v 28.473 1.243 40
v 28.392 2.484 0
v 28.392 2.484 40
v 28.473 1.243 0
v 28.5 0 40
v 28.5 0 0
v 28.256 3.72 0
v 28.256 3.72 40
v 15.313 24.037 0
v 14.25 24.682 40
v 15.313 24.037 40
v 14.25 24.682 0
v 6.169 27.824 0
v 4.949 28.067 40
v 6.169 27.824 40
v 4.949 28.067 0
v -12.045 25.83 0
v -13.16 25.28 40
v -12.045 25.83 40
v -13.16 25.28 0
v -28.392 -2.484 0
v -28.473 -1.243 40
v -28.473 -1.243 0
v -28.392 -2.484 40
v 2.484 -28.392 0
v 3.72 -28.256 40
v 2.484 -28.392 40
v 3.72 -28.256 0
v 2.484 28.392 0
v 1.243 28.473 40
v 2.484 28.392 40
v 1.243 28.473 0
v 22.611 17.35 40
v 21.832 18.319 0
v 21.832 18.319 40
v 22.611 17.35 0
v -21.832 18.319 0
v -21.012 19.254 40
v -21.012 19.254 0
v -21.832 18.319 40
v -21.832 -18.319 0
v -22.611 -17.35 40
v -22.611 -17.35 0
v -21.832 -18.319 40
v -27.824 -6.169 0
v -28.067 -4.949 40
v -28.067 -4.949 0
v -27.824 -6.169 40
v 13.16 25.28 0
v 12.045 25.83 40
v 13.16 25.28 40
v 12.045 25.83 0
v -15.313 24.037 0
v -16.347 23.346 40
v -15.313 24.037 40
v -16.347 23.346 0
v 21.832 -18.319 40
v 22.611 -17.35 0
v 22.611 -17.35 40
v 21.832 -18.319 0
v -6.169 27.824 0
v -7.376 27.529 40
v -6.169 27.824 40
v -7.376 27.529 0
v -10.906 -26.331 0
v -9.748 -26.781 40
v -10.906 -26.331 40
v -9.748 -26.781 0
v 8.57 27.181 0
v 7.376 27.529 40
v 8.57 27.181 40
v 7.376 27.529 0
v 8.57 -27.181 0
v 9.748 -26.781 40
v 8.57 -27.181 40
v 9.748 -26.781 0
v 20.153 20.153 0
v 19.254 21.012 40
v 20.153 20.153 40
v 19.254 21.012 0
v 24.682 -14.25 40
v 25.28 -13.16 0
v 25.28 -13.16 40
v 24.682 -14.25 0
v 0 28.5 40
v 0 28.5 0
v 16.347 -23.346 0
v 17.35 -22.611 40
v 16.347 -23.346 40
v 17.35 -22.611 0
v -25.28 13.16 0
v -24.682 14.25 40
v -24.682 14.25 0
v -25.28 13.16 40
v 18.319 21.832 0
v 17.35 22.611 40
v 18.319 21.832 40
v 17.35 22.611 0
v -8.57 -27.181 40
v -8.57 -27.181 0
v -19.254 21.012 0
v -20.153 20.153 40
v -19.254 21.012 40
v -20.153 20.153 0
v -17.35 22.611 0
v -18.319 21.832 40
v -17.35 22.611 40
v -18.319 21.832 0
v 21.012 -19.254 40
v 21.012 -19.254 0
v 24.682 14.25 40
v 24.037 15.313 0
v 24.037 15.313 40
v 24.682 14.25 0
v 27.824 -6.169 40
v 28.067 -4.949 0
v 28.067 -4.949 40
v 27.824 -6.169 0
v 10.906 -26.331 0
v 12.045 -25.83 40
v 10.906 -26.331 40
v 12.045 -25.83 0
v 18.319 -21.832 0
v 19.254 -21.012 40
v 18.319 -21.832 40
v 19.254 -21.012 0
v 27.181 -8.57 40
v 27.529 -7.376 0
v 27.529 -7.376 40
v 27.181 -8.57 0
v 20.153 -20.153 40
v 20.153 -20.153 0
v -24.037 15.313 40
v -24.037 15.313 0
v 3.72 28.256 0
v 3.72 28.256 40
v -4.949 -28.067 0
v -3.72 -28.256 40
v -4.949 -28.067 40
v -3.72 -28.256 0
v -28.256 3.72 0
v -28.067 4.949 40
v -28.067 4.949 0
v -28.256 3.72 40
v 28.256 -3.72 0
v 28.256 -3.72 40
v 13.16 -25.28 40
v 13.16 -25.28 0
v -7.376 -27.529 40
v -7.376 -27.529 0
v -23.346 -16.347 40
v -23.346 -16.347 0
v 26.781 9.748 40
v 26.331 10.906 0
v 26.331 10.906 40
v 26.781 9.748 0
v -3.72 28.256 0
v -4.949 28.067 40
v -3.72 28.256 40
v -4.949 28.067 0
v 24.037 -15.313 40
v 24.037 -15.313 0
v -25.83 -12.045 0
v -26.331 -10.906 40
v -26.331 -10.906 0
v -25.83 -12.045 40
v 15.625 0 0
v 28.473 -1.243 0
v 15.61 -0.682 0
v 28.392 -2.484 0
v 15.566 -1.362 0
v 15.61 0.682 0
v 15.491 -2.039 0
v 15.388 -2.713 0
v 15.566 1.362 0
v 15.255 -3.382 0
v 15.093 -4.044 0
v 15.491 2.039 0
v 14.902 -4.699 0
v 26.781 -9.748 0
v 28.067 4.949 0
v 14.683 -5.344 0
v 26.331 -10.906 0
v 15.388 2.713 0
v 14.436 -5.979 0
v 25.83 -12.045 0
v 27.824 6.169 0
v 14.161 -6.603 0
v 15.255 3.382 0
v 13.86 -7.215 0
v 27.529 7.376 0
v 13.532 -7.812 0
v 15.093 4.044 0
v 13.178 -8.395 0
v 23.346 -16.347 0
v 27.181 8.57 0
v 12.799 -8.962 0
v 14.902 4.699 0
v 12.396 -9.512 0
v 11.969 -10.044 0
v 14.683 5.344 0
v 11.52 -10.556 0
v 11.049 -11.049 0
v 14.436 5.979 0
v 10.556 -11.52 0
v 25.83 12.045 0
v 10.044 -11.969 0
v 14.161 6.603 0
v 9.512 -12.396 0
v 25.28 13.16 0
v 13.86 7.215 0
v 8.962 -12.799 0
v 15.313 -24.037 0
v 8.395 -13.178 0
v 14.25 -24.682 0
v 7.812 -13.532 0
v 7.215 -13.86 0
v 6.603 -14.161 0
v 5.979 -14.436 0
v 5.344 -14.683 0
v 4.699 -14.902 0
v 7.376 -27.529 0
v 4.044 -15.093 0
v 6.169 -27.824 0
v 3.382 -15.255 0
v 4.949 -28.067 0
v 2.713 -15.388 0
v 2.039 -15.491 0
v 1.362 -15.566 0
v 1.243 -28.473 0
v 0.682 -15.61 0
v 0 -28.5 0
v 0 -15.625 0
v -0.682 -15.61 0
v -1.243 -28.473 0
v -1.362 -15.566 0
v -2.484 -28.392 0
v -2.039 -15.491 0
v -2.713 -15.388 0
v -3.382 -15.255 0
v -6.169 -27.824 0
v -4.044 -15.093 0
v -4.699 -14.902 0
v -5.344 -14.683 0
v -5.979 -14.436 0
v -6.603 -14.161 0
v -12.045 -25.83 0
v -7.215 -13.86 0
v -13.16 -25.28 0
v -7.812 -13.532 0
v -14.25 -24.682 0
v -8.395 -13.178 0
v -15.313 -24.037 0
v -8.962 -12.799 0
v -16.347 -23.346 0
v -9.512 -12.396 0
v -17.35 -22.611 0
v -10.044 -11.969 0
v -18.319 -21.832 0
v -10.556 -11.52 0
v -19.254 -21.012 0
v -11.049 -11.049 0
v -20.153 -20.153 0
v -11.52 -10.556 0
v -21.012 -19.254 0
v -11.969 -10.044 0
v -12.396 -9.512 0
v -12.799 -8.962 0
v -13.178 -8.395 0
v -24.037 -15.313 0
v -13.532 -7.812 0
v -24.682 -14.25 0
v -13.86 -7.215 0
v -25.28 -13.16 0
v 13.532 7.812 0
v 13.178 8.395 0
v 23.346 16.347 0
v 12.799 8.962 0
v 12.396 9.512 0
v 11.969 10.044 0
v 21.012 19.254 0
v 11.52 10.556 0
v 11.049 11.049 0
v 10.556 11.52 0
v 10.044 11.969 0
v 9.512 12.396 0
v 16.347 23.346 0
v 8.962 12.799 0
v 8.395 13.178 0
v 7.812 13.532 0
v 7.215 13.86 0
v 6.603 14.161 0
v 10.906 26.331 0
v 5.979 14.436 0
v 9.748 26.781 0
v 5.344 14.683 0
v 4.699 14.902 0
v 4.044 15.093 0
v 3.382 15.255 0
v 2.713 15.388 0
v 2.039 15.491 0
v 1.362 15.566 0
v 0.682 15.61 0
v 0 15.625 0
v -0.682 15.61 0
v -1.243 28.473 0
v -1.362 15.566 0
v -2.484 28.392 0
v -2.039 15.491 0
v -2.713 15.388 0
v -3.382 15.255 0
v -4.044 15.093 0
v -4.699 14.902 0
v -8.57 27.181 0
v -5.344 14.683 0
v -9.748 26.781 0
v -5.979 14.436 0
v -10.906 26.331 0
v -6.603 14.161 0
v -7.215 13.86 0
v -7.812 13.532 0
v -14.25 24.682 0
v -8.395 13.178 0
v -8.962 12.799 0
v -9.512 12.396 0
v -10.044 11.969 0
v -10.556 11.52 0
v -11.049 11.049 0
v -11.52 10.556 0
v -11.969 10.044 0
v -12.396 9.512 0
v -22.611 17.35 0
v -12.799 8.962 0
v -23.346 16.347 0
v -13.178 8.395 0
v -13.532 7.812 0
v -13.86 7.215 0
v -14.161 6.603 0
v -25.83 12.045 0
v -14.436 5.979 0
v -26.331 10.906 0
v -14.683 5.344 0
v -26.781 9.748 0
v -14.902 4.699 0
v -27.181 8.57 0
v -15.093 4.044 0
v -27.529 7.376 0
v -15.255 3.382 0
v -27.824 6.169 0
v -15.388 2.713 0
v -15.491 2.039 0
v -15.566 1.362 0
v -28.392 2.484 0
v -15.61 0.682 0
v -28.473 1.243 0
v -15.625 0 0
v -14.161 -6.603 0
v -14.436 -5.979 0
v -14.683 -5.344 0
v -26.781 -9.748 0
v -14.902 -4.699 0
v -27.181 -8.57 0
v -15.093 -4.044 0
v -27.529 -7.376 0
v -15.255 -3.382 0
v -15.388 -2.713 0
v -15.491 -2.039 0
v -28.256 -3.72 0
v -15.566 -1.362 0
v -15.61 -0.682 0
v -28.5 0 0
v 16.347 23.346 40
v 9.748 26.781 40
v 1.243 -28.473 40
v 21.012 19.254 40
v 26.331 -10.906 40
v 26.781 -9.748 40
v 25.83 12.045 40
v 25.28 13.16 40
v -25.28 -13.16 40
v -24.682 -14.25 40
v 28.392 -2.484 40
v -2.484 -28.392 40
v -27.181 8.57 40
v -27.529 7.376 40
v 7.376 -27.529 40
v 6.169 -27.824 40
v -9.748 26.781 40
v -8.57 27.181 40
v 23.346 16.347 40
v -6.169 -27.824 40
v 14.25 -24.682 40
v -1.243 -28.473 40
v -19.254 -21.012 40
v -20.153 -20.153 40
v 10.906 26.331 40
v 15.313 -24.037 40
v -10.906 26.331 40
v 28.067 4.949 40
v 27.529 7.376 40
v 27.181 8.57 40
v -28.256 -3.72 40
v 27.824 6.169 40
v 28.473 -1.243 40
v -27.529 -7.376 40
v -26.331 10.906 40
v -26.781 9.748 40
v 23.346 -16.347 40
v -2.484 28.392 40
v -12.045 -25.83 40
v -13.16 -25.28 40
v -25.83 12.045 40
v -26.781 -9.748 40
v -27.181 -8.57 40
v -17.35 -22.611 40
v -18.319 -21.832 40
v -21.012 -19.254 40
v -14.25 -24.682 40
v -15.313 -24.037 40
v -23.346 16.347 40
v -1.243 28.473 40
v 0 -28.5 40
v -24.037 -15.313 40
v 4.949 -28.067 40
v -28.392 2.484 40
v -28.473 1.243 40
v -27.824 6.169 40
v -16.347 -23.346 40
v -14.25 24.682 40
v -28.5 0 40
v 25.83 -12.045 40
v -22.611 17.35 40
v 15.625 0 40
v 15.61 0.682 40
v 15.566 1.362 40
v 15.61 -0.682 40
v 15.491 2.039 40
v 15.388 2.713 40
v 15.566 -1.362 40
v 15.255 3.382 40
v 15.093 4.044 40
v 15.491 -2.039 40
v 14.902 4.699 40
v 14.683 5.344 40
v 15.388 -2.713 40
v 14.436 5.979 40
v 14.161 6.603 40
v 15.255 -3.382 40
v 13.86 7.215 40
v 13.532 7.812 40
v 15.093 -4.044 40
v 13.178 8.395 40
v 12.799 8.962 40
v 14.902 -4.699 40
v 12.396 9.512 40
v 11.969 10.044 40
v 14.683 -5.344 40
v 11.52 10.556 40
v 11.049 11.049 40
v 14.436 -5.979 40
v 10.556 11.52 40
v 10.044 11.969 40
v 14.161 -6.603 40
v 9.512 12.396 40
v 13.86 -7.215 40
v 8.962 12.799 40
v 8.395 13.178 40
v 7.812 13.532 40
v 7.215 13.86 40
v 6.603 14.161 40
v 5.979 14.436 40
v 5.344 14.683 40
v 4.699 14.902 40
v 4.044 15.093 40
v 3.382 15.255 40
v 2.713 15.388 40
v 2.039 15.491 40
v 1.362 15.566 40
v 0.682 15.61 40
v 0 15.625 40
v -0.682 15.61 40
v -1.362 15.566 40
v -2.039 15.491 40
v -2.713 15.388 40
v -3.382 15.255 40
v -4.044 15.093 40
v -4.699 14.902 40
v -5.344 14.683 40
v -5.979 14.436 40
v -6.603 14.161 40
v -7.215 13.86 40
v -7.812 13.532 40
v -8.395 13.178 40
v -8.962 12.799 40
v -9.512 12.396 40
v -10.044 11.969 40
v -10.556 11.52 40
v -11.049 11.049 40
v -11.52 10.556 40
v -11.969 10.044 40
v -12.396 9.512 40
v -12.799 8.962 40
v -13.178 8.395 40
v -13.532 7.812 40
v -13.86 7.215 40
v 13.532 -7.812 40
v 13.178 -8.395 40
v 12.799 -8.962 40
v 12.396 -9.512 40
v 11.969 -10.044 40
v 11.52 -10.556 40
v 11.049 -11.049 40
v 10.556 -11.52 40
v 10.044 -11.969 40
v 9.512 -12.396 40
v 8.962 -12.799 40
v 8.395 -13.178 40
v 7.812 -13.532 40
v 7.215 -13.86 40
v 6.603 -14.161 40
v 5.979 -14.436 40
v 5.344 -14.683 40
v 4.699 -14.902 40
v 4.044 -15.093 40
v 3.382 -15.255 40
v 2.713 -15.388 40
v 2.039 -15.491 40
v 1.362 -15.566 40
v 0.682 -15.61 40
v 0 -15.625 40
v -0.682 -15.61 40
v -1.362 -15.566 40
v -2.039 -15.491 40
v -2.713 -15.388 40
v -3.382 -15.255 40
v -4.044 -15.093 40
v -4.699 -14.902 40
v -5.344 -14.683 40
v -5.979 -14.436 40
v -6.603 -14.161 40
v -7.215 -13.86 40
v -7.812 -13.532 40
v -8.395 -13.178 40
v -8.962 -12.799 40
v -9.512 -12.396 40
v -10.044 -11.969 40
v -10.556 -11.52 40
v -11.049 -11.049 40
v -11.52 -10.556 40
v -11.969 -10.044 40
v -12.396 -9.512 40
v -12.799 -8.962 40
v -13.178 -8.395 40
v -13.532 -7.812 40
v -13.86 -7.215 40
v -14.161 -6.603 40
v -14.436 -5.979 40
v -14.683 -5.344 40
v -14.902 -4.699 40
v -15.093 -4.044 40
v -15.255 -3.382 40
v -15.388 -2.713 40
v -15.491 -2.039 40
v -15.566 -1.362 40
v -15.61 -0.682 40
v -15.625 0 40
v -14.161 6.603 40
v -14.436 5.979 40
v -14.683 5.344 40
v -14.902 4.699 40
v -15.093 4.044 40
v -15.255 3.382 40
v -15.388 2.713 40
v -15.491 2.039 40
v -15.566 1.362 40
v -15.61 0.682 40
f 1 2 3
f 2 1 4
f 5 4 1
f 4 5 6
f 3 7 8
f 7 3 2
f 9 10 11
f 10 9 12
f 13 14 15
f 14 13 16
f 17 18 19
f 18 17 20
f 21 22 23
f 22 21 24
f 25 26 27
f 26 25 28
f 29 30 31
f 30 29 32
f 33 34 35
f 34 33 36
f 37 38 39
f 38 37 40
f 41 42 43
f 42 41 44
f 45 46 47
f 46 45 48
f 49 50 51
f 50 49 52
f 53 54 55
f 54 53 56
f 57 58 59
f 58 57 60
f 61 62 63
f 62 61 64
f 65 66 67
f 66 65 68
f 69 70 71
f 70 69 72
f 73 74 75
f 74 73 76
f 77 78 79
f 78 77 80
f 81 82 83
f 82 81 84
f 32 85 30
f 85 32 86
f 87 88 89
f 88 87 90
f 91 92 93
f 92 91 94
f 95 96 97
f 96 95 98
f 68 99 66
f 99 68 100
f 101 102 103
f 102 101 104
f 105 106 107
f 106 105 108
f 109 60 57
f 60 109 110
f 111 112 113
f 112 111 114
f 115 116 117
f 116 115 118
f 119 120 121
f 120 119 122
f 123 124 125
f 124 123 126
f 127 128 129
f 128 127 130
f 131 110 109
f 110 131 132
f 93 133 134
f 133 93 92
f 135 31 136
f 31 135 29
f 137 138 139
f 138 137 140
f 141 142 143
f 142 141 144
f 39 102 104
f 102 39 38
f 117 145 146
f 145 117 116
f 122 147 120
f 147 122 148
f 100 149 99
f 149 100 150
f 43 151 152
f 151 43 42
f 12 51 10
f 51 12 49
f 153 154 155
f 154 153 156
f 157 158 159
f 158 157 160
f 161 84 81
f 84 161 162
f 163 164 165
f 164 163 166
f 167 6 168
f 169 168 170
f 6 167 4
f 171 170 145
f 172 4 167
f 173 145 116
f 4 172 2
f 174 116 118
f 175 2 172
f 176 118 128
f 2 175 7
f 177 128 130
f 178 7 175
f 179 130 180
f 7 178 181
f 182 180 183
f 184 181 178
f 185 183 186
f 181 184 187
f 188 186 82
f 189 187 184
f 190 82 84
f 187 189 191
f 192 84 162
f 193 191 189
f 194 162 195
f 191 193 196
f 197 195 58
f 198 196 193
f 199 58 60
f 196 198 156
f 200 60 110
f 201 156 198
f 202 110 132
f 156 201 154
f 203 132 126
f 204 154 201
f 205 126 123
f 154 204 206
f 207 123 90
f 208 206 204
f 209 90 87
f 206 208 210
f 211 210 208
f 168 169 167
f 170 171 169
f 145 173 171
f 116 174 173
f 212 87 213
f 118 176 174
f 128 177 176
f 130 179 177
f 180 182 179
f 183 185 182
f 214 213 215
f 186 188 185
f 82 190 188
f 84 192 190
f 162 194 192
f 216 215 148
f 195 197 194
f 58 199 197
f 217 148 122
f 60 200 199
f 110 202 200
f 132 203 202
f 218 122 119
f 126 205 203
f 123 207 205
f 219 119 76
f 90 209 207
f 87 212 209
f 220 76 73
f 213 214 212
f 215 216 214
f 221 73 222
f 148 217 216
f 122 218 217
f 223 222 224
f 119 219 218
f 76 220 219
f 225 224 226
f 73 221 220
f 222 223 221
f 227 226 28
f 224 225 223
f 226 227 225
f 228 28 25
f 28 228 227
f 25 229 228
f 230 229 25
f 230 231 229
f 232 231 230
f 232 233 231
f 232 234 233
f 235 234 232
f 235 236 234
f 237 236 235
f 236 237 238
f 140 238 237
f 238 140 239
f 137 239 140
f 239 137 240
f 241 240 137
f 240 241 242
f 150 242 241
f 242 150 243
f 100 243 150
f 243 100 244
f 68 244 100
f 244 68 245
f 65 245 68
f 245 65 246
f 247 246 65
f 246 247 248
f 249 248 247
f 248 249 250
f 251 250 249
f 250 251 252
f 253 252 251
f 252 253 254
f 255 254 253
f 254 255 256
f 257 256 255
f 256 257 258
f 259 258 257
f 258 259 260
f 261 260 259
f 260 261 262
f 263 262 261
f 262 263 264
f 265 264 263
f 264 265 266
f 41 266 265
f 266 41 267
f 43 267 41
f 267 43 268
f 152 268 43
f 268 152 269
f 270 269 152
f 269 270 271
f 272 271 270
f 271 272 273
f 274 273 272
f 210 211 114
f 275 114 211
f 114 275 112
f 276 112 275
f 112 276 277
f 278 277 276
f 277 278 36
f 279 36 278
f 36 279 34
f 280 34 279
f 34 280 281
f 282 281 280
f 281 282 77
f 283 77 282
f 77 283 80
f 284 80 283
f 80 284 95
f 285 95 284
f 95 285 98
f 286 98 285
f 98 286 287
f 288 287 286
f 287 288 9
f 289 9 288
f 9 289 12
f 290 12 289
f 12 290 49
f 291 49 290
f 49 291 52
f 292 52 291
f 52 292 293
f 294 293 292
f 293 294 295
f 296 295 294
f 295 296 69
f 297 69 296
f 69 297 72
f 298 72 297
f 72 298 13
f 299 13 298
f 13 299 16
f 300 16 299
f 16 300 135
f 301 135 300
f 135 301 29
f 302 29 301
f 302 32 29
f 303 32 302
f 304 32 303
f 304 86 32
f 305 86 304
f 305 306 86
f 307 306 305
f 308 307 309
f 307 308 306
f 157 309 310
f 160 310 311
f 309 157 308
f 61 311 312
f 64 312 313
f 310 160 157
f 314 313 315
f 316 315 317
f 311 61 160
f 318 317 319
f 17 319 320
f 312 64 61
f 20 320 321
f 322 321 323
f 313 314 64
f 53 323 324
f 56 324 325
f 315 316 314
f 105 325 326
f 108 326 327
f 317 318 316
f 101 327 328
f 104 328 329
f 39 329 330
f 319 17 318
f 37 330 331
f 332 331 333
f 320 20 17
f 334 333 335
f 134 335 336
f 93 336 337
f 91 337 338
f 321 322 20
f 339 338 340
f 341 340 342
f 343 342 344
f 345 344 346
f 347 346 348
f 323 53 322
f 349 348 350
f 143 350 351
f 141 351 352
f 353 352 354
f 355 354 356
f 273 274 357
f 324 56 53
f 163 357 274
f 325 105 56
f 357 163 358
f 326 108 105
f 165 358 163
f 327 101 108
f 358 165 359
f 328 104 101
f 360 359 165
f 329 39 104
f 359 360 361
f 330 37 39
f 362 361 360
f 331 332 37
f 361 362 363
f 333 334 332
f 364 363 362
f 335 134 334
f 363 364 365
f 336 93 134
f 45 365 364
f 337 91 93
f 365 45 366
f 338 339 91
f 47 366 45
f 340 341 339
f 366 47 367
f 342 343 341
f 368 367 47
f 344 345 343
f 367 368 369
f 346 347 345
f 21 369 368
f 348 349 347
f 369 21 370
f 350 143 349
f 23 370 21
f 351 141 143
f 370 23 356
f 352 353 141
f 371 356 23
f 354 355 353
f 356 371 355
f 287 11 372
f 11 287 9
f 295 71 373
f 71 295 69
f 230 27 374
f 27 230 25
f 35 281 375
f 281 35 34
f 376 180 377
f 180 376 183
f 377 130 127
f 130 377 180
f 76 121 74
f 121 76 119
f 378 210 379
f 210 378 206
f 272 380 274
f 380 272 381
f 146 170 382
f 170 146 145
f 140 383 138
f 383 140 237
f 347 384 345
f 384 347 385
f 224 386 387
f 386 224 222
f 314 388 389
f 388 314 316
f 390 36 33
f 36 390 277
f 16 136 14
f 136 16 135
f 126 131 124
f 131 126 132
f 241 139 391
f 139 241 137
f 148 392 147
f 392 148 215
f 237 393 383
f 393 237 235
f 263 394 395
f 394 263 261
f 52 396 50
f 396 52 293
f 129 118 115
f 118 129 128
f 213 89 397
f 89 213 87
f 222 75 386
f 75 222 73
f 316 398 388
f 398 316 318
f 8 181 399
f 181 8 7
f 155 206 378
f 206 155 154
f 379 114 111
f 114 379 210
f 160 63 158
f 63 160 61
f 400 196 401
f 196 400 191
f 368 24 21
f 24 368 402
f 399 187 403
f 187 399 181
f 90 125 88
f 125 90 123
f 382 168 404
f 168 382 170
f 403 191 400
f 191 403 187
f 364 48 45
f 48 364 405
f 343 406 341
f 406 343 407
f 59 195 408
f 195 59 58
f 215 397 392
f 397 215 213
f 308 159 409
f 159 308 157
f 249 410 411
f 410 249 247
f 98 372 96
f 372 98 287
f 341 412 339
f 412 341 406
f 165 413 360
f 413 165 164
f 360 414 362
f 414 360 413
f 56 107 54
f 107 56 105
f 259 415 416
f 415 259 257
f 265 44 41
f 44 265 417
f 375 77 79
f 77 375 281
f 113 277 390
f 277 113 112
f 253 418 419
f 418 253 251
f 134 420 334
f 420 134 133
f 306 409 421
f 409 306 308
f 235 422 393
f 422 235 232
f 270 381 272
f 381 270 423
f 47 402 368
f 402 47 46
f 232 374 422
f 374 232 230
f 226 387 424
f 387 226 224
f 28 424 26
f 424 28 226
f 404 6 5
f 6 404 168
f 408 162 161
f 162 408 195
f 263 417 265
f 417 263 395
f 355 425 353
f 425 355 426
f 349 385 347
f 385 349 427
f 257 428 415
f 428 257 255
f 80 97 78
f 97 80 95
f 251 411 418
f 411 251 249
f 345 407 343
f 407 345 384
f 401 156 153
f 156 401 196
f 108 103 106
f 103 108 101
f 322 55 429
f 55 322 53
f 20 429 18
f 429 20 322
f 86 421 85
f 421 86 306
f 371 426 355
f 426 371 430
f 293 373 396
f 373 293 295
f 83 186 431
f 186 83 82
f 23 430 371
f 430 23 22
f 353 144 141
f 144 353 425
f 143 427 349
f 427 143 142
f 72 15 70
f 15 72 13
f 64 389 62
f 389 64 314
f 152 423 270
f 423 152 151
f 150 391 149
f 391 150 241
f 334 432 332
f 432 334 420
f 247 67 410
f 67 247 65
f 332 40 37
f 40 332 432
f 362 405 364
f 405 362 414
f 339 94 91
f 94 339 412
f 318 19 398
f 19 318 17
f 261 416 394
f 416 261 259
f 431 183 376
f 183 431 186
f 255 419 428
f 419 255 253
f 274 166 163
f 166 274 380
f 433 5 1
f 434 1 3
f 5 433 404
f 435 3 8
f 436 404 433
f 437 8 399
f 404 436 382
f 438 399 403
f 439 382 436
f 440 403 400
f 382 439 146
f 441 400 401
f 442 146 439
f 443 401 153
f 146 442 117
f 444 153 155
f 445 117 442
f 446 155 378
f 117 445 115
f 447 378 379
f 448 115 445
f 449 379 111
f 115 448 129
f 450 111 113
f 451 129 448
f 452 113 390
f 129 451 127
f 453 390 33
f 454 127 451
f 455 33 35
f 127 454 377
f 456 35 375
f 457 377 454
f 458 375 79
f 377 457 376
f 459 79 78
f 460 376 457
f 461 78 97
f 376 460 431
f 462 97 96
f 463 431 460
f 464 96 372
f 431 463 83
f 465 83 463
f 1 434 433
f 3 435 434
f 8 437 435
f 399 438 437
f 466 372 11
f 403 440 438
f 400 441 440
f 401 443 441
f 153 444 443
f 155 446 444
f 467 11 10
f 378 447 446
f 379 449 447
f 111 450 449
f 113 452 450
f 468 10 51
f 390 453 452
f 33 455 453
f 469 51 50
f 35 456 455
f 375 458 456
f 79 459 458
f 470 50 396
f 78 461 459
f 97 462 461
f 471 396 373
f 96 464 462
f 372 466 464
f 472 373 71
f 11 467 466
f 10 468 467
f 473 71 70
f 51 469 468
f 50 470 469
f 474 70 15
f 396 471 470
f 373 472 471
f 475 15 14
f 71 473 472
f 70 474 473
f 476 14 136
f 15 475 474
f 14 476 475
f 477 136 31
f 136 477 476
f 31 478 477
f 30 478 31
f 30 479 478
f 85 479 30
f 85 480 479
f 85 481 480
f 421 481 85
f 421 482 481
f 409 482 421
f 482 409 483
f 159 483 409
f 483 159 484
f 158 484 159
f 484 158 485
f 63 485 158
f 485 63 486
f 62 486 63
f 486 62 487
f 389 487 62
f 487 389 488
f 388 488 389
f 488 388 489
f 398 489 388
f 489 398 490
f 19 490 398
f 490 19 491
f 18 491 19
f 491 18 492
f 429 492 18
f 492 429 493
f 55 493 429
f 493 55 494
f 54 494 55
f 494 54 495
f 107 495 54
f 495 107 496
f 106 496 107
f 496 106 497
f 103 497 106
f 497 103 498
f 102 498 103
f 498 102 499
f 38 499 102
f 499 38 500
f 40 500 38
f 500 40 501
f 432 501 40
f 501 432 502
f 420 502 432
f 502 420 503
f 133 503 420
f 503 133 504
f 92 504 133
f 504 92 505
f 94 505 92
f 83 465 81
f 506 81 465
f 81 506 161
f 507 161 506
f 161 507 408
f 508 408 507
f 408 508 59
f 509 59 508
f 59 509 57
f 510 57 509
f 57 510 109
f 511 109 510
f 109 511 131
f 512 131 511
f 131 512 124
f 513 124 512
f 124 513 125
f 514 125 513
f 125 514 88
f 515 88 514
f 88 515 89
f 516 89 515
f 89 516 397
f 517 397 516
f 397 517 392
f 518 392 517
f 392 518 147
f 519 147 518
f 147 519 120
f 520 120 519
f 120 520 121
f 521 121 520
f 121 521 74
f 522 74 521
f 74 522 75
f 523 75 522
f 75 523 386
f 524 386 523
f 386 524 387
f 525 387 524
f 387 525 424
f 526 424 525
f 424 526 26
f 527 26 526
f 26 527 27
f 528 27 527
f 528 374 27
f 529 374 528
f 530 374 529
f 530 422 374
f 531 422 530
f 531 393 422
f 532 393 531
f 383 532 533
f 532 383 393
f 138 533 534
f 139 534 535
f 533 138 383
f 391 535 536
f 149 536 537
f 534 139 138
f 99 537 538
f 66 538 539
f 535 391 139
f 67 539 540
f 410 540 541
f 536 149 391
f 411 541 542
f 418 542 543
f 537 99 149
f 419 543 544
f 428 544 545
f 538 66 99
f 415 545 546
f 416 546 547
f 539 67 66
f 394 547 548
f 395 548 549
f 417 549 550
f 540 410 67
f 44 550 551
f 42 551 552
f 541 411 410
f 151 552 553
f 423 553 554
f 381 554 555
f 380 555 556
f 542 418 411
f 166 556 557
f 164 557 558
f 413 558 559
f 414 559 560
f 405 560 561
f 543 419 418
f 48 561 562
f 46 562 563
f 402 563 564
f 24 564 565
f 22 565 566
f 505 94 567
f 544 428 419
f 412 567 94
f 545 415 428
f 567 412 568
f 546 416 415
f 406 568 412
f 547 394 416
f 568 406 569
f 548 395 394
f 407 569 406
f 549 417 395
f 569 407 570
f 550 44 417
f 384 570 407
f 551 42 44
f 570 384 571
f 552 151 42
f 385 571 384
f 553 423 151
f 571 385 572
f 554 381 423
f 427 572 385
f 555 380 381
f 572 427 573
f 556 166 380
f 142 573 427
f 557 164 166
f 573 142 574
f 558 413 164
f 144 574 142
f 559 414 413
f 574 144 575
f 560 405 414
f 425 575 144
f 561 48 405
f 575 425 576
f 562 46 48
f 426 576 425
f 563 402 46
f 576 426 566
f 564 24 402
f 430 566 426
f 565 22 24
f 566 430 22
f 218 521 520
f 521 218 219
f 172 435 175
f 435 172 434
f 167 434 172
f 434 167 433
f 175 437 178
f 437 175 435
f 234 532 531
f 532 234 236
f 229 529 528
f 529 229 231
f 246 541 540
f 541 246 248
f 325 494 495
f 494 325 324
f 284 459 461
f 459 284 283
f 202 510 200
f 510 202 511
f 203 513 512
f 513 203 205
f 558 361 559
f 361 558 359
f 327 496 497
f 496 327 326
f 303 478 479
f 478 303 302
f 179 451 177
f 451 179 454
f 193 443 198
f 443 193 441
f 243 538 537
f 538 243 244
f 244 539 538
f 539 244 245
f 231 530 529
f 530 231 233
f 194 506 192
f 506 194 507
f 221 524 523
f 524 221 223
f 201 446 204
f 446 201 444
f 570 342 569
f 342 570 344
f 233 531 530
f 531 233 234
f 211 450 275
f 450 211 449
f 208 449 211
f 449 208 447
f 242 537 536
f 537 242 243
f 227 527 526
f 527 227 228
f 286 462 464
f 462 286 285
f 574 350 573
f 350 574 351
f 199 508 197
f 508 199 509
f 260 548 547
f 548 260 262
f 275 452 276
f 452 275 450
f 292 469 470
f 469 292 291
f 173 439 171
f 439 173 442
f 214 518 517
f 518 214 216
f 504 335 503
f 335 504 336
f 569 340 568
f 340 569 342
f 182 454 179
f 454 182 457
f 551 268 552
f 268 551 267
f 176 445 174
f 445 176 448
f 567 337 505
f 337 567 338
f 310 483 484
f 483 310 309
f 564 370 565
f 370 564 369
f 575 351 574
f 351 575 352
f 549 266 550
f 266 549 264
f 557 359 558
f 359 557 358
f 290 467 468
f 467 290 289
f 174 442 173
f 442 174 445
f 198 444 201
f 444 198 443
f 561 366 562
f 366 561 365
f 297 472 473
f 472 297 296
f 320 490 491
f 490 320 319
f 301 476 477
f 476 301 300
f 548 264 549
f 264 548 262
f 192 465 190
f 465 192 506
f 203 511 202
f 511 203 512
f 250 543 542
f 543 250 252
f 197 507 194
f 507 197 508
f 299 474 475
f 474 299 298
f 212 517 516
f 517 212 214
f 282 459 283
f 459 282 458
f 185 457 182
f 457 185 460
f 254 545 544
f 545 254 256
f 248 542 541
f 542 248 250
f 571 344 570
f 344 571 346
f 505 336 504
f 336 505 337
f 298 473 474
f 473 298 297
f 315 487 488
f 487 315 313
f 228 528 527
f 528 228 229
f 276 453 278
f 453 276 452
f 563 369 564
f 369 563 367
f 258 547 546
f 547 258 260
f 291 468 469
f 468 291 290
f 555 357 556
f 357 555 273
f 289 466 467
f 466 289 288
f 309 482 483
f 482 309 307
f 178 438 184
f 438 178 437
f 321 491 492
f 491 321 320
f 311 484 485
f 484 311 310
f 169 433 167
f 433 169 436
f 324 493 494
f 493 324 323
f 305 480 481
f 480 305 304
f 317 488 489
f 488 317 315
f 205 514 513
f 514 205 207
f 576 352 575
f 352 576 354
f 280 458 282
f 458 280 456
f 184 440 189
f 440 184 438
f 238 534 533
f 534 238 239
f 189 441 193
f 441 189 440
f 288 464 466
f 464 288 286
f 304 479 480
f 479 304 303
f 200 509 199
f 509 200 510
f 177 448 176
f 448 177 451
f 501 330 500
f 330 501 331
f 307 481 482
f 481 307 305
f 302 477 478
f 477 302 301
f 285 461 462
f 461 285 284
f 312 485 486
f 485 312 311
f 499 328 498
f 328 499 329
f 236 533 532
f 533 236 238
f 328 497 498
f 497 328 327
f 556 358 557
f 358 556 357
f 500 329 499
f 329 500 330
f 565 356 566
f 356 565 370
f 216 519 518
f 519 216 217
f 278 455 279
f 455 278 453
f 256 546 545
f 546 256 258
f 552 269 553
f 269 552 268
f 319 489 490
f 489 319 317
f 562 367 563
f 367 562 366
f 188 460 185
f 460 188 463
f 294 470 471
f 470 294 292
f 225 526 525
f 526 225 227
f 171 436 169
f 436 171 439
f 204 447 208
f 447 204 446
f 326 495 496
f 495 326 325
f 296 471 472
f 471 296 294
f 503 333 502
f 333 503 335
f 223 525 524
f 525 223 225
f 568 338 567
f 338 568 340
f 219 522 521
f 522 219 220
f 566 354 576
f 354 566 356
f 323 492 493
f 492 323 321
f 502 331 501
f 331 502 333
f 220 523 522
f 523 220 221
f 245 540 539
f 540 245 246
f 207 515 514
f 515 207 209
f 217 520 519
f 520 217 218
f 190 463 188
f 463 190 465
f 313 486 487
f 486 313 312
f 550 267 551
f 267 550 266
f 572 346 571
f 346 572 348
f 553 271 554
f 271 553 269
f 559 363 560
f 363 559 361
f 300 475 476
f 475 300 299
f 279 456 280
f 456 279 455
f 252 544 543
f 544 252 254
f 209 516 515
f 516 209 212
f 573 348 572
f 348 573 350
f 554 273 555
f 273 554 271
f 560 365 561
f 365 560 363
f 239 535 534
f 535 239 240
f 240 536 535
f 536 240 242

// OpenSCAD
// [FL_INDEX: keywords="openscad, 3d_parametric, Small_shop_vac_to_Sears_router_table_dust_collector, csg_solid" | COT="Parametric OpenSCAD design from 3DCodeverse"]
// Title: Small shop vac to Sears router table dust collector

// Outer diameter in millimeters - use 57 for standard hose connection for 2 1/4" shop vac
outer = 57;
// Inner diameter in millimeters - use 31.25 for the tapered connector on a 1 1/4" shop vac
inner = 31.25;
// Length of adapter in millimeters
length = 40;

difference() {
cylinder( h=length, r=outer/2, center=false, $fn=144 );
cylinder( h=length, r=inner/2, center=false, $fn=144 );
}
